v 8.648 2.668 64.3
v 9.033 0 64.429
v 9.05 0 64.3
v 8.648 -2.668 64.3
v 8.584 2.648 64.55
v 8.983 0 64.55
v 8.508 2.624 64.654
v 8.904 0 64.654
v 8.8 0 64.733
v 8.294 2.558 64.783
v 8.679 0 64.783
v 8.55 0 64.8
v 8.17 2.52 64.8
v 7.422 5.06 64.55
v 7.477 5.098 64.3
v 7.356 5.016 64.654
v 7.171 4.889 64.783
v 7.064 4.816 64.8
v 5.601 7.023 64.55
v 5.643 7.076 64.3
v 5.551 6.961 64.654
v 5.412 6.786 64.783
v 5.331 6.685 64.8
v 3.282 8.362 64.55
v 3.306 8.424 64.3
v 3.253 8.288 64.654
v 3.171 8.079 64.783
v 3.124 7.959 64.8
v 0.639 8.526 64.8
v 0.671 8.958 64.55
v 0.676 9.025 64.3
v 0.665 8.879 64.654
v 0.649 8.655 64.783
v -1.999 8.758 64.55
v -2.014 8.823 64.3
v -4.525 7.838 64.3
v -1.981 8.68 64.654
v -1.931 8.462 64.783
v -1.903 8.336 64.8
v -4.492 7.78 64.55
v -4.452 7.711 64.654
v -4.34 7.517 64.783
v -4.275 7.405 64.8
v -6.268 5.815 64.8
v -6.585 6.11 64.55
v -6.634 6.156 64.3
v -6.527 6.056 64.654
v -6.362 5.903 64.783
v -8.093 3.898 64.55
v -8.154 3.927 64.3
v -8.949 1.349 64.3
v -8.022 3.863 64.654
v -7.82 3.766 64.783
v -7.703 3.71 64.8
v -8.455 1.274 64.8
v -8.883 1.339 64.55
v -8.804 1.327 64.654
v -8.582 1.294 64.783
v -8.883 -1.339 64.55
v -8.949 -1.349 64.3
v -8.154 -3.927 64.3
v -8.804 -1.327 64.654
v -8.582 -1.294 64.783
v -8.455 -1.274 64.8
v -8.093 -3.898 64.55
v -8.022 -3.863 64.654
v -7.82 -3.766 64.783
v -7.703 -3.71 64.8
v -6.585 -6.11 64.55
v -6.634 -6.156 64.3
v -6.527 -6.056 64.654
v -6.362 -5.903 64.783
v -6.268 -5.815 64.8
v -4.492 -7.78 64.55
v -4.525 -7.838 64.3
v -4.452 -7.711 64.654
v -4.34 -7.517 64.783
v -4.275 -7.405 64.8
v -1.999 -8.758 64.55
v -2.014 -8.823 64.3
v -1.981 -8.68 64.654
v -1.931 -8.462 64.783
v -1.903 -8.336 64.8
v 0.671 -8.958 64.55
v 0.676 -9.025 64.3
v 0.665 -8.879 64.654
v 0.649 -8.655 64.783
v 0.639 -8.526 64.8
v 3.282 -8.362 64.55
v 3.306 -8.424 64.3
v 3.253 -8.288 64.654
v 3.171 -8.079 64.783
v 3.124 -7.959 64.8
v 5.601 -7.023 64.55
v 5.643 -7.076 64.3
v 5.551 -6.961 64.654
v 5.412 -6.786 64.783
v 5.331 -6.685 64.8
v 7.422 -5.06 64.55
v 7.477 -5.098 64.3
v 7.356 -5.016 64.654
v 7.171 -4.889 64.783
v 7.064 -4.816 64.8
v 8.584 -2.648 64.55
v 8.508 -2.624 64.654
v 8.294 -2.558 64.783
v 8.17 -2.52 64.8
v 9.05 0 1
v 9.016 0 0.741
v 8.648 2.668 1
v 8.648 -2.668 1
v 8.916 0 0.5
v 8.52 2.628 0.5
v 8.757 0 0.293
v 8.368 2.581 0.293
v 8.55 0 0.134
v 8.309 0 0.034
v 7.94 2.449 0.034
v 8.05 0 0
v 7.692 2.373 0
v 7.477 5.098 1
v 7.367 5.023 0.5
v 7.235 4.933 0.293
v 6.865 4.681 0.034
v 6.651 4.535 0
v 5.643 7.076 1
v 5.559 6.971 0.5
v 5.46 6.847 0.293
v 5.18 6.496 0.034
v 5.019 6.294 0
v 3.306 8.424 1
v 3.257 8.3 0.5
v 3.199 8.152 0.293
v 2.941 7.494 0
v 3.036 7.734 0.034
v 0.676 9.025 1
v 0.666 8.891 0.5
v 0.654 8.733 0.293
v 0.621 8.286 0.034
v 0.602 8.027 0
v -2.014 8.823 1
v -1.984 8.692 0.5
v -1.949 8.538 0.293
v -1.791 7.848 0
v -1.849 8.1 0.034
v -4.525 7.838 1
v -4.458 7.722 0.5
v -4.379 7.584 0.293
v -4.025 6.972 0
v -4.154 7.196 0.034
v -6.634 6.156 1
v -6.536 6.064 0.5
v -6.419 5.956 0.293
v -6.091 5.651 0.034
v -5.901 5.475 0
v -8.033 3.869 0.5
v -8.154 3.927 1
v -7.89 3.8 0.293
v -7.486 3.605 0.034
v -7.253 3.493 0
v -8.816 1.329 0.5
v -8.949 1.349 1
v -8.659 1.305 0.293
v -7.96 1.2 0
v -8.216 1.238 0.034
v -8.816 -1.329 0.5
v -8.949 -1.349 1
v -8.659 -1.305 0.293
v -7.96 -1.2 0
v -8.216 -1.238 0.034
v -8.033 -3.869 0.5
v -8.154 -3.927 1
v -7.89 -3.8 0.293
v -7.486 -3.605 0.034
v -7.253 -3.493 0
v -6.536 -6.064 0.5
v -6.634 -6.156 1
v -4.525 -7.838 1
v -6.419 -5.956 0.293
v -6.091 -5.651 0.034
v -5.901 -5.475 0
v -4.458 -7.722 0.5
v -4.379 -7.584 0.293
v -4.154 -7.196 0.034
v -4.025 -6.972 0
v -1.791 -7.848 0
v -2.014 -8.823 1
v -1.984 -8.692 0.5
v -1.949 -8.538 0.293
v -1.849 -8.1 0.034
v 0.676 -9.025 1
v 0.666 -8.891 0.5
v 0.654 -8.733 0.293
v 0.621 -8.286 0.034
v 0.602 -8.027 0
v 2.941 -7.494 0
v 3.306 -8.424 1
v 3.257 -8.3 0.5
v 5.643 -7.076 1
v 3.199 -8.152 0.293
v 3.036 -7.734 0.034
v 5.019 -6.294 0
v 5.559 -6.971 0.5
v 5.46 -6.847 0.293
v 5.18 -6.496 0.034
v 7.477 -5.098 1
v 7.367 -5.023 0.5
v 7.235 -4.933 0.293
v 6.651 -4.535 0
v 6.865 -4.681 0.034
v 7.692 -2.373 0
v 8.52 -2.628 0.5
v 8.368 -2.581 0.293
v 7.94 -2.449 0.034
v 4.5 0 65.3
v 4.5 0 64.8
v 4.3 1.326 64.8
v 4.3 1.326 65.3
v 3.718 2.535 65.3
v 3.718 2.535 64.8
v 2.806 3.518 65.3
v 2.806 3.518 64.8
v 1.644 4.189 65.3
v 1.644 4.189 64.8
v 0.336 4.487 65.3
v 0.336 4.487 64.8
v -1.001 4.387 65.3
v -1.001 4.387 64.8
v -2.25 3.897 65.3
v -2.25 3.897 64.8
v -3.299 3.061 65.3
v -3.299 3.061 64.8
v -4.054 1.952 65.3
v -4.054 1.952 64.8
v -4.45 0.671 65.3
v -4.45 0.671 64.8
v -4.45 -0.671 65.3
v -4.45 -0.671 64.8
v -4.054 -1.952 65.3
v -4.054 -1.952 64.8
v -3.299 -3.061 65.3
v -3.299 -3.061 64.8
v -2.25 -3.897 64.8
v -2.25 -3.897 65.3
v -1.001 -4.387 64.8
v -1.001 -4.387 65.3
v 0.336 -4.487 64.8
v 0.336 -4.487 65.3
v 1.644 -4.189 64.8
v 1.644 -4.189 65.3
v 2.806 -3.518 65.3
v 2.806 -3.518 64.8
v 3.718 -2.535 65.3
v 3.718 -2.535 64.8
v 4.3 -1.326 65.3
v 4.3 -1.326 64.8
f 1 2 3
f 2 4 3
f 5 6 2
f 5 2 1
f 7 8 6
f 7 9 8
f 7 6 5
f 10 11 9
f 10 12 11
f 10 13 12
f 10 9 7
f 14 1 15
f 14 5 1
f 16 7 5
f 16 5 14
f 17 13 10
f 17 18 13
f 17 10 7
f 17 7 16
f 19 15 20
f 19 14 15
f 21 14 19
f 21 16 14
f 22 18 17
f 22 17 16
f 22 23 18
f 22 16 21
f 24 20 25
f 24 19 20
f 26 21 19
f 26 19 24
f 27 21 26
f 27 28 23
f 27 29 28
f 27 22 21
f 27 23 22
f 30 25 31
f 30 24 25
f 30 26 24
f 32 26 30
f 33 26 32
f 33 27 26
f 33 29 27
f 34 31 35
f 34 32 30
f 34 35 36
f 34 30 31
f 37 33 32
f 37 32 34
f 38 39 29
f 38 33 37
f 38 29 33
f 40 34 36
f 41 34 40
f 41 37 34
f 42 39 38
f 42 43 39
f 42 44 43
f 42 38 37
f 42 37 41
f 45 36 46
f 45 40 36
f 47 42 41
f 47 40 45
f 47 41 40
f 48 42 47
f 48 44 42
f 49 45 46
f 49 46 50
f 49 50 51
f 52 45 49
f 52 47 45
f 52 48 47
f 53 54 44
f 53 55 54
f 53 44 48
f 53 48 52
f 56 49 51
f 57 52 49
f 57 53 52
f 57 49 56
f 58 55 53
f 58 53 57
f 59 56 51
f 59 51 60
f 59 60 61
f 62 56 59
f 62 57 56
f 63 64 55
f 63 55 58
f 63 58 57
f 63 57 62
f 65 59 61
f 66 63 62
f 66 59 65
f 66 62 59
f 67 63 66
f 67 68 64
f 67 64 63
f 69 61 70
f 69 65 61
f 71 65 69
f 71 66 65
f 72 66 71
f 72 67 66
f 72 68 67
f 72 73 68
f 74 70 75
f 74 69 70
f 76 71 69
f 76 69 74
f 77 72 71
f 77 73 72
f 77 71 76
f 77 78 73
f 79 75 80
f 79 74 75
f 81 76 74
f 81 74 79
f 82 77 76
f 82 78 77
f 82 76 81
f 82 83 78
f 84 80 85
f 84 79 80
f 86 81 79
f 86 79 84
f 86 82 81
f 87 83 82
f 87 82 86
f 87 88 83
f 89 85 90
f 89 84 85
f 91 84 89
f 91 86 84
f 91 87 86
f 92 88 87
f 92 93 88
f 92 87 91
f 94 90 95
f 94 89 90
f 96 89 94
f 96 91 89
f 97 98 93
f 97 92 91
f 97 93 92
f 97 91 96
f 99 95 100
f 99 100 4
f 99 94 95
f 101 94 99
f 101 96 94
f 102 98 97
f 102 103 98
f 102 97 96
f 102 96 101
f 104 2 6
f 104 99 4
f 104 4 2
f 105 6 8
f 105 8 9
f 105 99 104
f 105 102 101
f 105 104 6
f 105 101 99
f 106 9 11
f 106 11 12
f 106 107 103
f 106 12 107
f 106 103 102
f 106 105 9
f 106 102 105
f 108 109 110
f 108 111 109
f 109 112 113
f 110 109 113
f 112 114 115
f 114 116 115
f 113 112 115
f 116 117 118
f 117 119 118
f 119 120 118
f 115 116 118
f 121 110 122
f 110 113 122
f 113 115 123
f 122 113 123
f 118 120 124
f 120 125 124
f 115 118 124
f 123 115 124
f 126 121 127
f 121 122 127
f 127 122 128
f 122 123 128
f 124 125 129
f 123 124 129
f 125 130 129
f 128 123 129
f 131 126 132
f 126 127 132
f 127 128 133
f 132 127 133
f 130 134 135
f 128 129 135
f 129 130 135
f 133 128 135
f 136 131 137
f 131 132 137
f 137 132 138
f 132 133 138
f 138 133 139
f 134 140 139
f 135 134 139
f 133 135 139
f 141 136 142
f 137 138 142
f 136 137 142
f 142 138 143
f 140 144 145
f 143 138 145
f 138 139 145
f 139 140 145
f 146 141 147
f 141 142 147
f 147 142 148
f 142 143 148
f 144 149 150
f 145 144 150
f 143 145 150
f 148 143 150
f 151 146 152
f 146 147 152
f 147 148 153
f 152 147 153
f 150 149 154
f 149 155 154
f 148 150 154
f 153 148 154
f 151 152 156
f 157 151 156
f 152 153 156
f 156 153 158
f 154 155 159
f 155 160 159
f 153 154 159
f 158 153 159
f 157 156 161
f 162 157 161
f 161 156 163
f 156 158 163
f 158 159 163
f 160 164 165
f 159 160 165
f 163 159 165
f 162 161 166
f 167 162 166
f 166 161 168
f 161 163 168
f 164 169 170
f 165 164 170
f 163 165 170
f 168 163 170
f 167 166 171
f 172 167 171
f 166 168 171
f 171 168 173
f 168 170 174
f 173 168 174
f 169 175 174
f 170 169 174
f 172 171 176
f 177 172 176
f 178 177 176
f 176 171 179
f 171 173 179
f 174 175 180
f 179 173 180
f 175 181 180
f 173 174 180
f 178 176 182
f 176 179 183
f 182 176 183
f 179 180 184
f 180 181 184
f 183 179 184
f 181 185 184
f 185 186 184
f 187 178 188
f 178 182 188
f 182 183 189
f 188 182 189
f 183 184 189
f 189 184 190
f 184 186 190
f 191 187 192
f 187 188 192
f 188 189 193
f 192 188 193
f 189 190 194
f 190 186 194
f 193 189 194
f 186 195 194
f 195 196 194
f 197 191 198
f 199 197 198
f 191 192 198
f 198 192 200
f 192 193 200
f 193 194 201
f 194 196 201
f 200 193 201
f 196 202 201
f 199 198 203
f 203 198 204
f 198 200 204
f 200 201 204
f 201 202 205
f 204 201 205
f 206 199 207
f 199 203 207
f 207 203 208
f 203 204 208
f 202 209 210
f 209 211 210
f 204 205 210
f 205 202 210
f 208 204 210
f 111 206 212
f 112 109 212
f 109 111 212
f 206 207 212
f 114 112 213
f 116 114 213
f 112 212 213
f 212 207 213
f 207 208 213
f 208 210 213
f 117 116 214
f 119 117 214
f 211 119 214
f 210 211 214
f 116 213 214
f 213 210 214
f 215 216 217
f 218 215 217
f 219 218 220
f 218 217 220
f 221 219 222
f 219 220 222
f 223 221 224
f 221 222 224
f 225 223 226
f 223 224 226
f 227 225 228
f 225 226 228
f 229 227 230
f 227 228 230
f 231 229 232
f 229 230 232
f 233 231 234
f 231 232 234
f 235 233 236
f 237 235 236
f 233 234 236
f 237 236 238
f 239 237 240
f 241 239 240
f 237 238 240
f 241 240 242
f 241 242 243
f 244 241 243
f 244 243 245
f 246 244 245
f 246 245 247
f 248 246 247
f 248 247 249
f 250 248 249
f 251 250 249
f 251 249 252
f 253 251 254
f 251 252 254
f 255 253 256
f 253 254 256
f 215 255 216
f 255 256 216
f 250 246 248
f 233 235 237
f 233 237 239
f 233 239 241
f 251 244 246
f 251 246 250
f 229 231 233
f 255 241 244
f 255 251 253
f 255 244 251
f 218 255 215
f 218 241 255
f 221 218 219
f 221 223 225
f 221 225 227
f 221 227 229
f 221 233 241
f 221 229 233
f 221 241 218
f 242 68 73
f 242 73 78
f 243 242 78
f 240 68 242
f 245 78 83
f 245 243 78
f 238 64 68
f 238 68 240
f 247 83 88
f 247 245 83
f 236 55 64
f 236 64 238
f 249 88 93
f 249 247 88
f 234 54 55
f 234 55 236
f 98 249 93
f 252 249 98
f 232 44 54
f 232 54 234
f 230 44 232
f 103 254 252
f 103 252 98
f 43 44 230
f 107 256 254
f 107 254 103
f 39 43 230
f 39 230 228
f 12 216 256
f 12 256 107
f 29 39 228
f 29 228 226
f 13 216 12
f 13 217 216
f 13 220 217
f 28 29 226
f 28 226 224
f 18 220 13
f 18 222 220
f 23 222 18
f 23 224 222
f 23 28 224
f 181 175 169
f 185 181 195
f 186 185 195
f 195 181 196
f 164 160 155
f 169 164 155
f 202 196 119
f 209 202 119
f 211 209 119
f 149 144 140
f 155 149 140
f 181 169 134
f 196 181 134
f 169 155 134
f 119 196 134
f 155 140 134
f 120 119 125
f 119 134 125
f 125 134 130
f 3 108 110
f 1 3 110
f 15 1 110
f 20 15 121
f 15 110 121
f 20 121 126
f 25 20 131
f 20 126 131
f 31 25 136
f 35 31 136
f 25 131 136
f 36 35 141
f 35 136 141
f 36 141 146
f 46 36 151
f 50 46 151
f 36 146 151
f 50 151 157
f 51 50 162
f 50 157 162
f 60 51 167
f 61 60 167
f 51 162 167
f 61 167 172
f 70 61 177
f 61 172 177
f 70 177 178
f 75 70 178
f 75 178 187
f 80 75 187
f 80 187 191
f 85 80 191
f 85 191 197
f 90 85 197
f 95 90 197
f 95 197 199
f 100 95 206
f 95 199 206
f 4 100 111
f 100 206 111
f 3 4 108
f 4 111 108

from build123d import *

# Parameters (mm, degrees)
F0_R     = 9.05
F1_DEPTH = 64.8
F2_R     = 1
F3_R     = 4.5
F4_DEPTH = 0.5
F5_R     = 0.5


with BuildPart() as f1:
    # F0 (on Top) → F1 (new body)
    with BuildSketch(Plane.XY):
        Circle(F0_R)
    extrude(amount=F1_DEPTH)

    # F2
    f2_edges = [f1.edges().sort_by_distance(p)[0] for p in [
        (-9.05, 0, 0),
    ]]
    fillet(f2_edges, radius=F2_R)

    # F3 (on face) → F4 (join)
    with BuildSketch(Plane.XY.offset(64.8)):
        Circle(F3_R)
    extrude(amount=F4_DEPTH)

    # F5
    f5_edges = [f1.edges().sort_by_distance(p)[0] for p in [
        (-9.05, 0, 64.8),
    ]]
    fillet(f5_edges, radius=F5_R)


solid = f1.part
